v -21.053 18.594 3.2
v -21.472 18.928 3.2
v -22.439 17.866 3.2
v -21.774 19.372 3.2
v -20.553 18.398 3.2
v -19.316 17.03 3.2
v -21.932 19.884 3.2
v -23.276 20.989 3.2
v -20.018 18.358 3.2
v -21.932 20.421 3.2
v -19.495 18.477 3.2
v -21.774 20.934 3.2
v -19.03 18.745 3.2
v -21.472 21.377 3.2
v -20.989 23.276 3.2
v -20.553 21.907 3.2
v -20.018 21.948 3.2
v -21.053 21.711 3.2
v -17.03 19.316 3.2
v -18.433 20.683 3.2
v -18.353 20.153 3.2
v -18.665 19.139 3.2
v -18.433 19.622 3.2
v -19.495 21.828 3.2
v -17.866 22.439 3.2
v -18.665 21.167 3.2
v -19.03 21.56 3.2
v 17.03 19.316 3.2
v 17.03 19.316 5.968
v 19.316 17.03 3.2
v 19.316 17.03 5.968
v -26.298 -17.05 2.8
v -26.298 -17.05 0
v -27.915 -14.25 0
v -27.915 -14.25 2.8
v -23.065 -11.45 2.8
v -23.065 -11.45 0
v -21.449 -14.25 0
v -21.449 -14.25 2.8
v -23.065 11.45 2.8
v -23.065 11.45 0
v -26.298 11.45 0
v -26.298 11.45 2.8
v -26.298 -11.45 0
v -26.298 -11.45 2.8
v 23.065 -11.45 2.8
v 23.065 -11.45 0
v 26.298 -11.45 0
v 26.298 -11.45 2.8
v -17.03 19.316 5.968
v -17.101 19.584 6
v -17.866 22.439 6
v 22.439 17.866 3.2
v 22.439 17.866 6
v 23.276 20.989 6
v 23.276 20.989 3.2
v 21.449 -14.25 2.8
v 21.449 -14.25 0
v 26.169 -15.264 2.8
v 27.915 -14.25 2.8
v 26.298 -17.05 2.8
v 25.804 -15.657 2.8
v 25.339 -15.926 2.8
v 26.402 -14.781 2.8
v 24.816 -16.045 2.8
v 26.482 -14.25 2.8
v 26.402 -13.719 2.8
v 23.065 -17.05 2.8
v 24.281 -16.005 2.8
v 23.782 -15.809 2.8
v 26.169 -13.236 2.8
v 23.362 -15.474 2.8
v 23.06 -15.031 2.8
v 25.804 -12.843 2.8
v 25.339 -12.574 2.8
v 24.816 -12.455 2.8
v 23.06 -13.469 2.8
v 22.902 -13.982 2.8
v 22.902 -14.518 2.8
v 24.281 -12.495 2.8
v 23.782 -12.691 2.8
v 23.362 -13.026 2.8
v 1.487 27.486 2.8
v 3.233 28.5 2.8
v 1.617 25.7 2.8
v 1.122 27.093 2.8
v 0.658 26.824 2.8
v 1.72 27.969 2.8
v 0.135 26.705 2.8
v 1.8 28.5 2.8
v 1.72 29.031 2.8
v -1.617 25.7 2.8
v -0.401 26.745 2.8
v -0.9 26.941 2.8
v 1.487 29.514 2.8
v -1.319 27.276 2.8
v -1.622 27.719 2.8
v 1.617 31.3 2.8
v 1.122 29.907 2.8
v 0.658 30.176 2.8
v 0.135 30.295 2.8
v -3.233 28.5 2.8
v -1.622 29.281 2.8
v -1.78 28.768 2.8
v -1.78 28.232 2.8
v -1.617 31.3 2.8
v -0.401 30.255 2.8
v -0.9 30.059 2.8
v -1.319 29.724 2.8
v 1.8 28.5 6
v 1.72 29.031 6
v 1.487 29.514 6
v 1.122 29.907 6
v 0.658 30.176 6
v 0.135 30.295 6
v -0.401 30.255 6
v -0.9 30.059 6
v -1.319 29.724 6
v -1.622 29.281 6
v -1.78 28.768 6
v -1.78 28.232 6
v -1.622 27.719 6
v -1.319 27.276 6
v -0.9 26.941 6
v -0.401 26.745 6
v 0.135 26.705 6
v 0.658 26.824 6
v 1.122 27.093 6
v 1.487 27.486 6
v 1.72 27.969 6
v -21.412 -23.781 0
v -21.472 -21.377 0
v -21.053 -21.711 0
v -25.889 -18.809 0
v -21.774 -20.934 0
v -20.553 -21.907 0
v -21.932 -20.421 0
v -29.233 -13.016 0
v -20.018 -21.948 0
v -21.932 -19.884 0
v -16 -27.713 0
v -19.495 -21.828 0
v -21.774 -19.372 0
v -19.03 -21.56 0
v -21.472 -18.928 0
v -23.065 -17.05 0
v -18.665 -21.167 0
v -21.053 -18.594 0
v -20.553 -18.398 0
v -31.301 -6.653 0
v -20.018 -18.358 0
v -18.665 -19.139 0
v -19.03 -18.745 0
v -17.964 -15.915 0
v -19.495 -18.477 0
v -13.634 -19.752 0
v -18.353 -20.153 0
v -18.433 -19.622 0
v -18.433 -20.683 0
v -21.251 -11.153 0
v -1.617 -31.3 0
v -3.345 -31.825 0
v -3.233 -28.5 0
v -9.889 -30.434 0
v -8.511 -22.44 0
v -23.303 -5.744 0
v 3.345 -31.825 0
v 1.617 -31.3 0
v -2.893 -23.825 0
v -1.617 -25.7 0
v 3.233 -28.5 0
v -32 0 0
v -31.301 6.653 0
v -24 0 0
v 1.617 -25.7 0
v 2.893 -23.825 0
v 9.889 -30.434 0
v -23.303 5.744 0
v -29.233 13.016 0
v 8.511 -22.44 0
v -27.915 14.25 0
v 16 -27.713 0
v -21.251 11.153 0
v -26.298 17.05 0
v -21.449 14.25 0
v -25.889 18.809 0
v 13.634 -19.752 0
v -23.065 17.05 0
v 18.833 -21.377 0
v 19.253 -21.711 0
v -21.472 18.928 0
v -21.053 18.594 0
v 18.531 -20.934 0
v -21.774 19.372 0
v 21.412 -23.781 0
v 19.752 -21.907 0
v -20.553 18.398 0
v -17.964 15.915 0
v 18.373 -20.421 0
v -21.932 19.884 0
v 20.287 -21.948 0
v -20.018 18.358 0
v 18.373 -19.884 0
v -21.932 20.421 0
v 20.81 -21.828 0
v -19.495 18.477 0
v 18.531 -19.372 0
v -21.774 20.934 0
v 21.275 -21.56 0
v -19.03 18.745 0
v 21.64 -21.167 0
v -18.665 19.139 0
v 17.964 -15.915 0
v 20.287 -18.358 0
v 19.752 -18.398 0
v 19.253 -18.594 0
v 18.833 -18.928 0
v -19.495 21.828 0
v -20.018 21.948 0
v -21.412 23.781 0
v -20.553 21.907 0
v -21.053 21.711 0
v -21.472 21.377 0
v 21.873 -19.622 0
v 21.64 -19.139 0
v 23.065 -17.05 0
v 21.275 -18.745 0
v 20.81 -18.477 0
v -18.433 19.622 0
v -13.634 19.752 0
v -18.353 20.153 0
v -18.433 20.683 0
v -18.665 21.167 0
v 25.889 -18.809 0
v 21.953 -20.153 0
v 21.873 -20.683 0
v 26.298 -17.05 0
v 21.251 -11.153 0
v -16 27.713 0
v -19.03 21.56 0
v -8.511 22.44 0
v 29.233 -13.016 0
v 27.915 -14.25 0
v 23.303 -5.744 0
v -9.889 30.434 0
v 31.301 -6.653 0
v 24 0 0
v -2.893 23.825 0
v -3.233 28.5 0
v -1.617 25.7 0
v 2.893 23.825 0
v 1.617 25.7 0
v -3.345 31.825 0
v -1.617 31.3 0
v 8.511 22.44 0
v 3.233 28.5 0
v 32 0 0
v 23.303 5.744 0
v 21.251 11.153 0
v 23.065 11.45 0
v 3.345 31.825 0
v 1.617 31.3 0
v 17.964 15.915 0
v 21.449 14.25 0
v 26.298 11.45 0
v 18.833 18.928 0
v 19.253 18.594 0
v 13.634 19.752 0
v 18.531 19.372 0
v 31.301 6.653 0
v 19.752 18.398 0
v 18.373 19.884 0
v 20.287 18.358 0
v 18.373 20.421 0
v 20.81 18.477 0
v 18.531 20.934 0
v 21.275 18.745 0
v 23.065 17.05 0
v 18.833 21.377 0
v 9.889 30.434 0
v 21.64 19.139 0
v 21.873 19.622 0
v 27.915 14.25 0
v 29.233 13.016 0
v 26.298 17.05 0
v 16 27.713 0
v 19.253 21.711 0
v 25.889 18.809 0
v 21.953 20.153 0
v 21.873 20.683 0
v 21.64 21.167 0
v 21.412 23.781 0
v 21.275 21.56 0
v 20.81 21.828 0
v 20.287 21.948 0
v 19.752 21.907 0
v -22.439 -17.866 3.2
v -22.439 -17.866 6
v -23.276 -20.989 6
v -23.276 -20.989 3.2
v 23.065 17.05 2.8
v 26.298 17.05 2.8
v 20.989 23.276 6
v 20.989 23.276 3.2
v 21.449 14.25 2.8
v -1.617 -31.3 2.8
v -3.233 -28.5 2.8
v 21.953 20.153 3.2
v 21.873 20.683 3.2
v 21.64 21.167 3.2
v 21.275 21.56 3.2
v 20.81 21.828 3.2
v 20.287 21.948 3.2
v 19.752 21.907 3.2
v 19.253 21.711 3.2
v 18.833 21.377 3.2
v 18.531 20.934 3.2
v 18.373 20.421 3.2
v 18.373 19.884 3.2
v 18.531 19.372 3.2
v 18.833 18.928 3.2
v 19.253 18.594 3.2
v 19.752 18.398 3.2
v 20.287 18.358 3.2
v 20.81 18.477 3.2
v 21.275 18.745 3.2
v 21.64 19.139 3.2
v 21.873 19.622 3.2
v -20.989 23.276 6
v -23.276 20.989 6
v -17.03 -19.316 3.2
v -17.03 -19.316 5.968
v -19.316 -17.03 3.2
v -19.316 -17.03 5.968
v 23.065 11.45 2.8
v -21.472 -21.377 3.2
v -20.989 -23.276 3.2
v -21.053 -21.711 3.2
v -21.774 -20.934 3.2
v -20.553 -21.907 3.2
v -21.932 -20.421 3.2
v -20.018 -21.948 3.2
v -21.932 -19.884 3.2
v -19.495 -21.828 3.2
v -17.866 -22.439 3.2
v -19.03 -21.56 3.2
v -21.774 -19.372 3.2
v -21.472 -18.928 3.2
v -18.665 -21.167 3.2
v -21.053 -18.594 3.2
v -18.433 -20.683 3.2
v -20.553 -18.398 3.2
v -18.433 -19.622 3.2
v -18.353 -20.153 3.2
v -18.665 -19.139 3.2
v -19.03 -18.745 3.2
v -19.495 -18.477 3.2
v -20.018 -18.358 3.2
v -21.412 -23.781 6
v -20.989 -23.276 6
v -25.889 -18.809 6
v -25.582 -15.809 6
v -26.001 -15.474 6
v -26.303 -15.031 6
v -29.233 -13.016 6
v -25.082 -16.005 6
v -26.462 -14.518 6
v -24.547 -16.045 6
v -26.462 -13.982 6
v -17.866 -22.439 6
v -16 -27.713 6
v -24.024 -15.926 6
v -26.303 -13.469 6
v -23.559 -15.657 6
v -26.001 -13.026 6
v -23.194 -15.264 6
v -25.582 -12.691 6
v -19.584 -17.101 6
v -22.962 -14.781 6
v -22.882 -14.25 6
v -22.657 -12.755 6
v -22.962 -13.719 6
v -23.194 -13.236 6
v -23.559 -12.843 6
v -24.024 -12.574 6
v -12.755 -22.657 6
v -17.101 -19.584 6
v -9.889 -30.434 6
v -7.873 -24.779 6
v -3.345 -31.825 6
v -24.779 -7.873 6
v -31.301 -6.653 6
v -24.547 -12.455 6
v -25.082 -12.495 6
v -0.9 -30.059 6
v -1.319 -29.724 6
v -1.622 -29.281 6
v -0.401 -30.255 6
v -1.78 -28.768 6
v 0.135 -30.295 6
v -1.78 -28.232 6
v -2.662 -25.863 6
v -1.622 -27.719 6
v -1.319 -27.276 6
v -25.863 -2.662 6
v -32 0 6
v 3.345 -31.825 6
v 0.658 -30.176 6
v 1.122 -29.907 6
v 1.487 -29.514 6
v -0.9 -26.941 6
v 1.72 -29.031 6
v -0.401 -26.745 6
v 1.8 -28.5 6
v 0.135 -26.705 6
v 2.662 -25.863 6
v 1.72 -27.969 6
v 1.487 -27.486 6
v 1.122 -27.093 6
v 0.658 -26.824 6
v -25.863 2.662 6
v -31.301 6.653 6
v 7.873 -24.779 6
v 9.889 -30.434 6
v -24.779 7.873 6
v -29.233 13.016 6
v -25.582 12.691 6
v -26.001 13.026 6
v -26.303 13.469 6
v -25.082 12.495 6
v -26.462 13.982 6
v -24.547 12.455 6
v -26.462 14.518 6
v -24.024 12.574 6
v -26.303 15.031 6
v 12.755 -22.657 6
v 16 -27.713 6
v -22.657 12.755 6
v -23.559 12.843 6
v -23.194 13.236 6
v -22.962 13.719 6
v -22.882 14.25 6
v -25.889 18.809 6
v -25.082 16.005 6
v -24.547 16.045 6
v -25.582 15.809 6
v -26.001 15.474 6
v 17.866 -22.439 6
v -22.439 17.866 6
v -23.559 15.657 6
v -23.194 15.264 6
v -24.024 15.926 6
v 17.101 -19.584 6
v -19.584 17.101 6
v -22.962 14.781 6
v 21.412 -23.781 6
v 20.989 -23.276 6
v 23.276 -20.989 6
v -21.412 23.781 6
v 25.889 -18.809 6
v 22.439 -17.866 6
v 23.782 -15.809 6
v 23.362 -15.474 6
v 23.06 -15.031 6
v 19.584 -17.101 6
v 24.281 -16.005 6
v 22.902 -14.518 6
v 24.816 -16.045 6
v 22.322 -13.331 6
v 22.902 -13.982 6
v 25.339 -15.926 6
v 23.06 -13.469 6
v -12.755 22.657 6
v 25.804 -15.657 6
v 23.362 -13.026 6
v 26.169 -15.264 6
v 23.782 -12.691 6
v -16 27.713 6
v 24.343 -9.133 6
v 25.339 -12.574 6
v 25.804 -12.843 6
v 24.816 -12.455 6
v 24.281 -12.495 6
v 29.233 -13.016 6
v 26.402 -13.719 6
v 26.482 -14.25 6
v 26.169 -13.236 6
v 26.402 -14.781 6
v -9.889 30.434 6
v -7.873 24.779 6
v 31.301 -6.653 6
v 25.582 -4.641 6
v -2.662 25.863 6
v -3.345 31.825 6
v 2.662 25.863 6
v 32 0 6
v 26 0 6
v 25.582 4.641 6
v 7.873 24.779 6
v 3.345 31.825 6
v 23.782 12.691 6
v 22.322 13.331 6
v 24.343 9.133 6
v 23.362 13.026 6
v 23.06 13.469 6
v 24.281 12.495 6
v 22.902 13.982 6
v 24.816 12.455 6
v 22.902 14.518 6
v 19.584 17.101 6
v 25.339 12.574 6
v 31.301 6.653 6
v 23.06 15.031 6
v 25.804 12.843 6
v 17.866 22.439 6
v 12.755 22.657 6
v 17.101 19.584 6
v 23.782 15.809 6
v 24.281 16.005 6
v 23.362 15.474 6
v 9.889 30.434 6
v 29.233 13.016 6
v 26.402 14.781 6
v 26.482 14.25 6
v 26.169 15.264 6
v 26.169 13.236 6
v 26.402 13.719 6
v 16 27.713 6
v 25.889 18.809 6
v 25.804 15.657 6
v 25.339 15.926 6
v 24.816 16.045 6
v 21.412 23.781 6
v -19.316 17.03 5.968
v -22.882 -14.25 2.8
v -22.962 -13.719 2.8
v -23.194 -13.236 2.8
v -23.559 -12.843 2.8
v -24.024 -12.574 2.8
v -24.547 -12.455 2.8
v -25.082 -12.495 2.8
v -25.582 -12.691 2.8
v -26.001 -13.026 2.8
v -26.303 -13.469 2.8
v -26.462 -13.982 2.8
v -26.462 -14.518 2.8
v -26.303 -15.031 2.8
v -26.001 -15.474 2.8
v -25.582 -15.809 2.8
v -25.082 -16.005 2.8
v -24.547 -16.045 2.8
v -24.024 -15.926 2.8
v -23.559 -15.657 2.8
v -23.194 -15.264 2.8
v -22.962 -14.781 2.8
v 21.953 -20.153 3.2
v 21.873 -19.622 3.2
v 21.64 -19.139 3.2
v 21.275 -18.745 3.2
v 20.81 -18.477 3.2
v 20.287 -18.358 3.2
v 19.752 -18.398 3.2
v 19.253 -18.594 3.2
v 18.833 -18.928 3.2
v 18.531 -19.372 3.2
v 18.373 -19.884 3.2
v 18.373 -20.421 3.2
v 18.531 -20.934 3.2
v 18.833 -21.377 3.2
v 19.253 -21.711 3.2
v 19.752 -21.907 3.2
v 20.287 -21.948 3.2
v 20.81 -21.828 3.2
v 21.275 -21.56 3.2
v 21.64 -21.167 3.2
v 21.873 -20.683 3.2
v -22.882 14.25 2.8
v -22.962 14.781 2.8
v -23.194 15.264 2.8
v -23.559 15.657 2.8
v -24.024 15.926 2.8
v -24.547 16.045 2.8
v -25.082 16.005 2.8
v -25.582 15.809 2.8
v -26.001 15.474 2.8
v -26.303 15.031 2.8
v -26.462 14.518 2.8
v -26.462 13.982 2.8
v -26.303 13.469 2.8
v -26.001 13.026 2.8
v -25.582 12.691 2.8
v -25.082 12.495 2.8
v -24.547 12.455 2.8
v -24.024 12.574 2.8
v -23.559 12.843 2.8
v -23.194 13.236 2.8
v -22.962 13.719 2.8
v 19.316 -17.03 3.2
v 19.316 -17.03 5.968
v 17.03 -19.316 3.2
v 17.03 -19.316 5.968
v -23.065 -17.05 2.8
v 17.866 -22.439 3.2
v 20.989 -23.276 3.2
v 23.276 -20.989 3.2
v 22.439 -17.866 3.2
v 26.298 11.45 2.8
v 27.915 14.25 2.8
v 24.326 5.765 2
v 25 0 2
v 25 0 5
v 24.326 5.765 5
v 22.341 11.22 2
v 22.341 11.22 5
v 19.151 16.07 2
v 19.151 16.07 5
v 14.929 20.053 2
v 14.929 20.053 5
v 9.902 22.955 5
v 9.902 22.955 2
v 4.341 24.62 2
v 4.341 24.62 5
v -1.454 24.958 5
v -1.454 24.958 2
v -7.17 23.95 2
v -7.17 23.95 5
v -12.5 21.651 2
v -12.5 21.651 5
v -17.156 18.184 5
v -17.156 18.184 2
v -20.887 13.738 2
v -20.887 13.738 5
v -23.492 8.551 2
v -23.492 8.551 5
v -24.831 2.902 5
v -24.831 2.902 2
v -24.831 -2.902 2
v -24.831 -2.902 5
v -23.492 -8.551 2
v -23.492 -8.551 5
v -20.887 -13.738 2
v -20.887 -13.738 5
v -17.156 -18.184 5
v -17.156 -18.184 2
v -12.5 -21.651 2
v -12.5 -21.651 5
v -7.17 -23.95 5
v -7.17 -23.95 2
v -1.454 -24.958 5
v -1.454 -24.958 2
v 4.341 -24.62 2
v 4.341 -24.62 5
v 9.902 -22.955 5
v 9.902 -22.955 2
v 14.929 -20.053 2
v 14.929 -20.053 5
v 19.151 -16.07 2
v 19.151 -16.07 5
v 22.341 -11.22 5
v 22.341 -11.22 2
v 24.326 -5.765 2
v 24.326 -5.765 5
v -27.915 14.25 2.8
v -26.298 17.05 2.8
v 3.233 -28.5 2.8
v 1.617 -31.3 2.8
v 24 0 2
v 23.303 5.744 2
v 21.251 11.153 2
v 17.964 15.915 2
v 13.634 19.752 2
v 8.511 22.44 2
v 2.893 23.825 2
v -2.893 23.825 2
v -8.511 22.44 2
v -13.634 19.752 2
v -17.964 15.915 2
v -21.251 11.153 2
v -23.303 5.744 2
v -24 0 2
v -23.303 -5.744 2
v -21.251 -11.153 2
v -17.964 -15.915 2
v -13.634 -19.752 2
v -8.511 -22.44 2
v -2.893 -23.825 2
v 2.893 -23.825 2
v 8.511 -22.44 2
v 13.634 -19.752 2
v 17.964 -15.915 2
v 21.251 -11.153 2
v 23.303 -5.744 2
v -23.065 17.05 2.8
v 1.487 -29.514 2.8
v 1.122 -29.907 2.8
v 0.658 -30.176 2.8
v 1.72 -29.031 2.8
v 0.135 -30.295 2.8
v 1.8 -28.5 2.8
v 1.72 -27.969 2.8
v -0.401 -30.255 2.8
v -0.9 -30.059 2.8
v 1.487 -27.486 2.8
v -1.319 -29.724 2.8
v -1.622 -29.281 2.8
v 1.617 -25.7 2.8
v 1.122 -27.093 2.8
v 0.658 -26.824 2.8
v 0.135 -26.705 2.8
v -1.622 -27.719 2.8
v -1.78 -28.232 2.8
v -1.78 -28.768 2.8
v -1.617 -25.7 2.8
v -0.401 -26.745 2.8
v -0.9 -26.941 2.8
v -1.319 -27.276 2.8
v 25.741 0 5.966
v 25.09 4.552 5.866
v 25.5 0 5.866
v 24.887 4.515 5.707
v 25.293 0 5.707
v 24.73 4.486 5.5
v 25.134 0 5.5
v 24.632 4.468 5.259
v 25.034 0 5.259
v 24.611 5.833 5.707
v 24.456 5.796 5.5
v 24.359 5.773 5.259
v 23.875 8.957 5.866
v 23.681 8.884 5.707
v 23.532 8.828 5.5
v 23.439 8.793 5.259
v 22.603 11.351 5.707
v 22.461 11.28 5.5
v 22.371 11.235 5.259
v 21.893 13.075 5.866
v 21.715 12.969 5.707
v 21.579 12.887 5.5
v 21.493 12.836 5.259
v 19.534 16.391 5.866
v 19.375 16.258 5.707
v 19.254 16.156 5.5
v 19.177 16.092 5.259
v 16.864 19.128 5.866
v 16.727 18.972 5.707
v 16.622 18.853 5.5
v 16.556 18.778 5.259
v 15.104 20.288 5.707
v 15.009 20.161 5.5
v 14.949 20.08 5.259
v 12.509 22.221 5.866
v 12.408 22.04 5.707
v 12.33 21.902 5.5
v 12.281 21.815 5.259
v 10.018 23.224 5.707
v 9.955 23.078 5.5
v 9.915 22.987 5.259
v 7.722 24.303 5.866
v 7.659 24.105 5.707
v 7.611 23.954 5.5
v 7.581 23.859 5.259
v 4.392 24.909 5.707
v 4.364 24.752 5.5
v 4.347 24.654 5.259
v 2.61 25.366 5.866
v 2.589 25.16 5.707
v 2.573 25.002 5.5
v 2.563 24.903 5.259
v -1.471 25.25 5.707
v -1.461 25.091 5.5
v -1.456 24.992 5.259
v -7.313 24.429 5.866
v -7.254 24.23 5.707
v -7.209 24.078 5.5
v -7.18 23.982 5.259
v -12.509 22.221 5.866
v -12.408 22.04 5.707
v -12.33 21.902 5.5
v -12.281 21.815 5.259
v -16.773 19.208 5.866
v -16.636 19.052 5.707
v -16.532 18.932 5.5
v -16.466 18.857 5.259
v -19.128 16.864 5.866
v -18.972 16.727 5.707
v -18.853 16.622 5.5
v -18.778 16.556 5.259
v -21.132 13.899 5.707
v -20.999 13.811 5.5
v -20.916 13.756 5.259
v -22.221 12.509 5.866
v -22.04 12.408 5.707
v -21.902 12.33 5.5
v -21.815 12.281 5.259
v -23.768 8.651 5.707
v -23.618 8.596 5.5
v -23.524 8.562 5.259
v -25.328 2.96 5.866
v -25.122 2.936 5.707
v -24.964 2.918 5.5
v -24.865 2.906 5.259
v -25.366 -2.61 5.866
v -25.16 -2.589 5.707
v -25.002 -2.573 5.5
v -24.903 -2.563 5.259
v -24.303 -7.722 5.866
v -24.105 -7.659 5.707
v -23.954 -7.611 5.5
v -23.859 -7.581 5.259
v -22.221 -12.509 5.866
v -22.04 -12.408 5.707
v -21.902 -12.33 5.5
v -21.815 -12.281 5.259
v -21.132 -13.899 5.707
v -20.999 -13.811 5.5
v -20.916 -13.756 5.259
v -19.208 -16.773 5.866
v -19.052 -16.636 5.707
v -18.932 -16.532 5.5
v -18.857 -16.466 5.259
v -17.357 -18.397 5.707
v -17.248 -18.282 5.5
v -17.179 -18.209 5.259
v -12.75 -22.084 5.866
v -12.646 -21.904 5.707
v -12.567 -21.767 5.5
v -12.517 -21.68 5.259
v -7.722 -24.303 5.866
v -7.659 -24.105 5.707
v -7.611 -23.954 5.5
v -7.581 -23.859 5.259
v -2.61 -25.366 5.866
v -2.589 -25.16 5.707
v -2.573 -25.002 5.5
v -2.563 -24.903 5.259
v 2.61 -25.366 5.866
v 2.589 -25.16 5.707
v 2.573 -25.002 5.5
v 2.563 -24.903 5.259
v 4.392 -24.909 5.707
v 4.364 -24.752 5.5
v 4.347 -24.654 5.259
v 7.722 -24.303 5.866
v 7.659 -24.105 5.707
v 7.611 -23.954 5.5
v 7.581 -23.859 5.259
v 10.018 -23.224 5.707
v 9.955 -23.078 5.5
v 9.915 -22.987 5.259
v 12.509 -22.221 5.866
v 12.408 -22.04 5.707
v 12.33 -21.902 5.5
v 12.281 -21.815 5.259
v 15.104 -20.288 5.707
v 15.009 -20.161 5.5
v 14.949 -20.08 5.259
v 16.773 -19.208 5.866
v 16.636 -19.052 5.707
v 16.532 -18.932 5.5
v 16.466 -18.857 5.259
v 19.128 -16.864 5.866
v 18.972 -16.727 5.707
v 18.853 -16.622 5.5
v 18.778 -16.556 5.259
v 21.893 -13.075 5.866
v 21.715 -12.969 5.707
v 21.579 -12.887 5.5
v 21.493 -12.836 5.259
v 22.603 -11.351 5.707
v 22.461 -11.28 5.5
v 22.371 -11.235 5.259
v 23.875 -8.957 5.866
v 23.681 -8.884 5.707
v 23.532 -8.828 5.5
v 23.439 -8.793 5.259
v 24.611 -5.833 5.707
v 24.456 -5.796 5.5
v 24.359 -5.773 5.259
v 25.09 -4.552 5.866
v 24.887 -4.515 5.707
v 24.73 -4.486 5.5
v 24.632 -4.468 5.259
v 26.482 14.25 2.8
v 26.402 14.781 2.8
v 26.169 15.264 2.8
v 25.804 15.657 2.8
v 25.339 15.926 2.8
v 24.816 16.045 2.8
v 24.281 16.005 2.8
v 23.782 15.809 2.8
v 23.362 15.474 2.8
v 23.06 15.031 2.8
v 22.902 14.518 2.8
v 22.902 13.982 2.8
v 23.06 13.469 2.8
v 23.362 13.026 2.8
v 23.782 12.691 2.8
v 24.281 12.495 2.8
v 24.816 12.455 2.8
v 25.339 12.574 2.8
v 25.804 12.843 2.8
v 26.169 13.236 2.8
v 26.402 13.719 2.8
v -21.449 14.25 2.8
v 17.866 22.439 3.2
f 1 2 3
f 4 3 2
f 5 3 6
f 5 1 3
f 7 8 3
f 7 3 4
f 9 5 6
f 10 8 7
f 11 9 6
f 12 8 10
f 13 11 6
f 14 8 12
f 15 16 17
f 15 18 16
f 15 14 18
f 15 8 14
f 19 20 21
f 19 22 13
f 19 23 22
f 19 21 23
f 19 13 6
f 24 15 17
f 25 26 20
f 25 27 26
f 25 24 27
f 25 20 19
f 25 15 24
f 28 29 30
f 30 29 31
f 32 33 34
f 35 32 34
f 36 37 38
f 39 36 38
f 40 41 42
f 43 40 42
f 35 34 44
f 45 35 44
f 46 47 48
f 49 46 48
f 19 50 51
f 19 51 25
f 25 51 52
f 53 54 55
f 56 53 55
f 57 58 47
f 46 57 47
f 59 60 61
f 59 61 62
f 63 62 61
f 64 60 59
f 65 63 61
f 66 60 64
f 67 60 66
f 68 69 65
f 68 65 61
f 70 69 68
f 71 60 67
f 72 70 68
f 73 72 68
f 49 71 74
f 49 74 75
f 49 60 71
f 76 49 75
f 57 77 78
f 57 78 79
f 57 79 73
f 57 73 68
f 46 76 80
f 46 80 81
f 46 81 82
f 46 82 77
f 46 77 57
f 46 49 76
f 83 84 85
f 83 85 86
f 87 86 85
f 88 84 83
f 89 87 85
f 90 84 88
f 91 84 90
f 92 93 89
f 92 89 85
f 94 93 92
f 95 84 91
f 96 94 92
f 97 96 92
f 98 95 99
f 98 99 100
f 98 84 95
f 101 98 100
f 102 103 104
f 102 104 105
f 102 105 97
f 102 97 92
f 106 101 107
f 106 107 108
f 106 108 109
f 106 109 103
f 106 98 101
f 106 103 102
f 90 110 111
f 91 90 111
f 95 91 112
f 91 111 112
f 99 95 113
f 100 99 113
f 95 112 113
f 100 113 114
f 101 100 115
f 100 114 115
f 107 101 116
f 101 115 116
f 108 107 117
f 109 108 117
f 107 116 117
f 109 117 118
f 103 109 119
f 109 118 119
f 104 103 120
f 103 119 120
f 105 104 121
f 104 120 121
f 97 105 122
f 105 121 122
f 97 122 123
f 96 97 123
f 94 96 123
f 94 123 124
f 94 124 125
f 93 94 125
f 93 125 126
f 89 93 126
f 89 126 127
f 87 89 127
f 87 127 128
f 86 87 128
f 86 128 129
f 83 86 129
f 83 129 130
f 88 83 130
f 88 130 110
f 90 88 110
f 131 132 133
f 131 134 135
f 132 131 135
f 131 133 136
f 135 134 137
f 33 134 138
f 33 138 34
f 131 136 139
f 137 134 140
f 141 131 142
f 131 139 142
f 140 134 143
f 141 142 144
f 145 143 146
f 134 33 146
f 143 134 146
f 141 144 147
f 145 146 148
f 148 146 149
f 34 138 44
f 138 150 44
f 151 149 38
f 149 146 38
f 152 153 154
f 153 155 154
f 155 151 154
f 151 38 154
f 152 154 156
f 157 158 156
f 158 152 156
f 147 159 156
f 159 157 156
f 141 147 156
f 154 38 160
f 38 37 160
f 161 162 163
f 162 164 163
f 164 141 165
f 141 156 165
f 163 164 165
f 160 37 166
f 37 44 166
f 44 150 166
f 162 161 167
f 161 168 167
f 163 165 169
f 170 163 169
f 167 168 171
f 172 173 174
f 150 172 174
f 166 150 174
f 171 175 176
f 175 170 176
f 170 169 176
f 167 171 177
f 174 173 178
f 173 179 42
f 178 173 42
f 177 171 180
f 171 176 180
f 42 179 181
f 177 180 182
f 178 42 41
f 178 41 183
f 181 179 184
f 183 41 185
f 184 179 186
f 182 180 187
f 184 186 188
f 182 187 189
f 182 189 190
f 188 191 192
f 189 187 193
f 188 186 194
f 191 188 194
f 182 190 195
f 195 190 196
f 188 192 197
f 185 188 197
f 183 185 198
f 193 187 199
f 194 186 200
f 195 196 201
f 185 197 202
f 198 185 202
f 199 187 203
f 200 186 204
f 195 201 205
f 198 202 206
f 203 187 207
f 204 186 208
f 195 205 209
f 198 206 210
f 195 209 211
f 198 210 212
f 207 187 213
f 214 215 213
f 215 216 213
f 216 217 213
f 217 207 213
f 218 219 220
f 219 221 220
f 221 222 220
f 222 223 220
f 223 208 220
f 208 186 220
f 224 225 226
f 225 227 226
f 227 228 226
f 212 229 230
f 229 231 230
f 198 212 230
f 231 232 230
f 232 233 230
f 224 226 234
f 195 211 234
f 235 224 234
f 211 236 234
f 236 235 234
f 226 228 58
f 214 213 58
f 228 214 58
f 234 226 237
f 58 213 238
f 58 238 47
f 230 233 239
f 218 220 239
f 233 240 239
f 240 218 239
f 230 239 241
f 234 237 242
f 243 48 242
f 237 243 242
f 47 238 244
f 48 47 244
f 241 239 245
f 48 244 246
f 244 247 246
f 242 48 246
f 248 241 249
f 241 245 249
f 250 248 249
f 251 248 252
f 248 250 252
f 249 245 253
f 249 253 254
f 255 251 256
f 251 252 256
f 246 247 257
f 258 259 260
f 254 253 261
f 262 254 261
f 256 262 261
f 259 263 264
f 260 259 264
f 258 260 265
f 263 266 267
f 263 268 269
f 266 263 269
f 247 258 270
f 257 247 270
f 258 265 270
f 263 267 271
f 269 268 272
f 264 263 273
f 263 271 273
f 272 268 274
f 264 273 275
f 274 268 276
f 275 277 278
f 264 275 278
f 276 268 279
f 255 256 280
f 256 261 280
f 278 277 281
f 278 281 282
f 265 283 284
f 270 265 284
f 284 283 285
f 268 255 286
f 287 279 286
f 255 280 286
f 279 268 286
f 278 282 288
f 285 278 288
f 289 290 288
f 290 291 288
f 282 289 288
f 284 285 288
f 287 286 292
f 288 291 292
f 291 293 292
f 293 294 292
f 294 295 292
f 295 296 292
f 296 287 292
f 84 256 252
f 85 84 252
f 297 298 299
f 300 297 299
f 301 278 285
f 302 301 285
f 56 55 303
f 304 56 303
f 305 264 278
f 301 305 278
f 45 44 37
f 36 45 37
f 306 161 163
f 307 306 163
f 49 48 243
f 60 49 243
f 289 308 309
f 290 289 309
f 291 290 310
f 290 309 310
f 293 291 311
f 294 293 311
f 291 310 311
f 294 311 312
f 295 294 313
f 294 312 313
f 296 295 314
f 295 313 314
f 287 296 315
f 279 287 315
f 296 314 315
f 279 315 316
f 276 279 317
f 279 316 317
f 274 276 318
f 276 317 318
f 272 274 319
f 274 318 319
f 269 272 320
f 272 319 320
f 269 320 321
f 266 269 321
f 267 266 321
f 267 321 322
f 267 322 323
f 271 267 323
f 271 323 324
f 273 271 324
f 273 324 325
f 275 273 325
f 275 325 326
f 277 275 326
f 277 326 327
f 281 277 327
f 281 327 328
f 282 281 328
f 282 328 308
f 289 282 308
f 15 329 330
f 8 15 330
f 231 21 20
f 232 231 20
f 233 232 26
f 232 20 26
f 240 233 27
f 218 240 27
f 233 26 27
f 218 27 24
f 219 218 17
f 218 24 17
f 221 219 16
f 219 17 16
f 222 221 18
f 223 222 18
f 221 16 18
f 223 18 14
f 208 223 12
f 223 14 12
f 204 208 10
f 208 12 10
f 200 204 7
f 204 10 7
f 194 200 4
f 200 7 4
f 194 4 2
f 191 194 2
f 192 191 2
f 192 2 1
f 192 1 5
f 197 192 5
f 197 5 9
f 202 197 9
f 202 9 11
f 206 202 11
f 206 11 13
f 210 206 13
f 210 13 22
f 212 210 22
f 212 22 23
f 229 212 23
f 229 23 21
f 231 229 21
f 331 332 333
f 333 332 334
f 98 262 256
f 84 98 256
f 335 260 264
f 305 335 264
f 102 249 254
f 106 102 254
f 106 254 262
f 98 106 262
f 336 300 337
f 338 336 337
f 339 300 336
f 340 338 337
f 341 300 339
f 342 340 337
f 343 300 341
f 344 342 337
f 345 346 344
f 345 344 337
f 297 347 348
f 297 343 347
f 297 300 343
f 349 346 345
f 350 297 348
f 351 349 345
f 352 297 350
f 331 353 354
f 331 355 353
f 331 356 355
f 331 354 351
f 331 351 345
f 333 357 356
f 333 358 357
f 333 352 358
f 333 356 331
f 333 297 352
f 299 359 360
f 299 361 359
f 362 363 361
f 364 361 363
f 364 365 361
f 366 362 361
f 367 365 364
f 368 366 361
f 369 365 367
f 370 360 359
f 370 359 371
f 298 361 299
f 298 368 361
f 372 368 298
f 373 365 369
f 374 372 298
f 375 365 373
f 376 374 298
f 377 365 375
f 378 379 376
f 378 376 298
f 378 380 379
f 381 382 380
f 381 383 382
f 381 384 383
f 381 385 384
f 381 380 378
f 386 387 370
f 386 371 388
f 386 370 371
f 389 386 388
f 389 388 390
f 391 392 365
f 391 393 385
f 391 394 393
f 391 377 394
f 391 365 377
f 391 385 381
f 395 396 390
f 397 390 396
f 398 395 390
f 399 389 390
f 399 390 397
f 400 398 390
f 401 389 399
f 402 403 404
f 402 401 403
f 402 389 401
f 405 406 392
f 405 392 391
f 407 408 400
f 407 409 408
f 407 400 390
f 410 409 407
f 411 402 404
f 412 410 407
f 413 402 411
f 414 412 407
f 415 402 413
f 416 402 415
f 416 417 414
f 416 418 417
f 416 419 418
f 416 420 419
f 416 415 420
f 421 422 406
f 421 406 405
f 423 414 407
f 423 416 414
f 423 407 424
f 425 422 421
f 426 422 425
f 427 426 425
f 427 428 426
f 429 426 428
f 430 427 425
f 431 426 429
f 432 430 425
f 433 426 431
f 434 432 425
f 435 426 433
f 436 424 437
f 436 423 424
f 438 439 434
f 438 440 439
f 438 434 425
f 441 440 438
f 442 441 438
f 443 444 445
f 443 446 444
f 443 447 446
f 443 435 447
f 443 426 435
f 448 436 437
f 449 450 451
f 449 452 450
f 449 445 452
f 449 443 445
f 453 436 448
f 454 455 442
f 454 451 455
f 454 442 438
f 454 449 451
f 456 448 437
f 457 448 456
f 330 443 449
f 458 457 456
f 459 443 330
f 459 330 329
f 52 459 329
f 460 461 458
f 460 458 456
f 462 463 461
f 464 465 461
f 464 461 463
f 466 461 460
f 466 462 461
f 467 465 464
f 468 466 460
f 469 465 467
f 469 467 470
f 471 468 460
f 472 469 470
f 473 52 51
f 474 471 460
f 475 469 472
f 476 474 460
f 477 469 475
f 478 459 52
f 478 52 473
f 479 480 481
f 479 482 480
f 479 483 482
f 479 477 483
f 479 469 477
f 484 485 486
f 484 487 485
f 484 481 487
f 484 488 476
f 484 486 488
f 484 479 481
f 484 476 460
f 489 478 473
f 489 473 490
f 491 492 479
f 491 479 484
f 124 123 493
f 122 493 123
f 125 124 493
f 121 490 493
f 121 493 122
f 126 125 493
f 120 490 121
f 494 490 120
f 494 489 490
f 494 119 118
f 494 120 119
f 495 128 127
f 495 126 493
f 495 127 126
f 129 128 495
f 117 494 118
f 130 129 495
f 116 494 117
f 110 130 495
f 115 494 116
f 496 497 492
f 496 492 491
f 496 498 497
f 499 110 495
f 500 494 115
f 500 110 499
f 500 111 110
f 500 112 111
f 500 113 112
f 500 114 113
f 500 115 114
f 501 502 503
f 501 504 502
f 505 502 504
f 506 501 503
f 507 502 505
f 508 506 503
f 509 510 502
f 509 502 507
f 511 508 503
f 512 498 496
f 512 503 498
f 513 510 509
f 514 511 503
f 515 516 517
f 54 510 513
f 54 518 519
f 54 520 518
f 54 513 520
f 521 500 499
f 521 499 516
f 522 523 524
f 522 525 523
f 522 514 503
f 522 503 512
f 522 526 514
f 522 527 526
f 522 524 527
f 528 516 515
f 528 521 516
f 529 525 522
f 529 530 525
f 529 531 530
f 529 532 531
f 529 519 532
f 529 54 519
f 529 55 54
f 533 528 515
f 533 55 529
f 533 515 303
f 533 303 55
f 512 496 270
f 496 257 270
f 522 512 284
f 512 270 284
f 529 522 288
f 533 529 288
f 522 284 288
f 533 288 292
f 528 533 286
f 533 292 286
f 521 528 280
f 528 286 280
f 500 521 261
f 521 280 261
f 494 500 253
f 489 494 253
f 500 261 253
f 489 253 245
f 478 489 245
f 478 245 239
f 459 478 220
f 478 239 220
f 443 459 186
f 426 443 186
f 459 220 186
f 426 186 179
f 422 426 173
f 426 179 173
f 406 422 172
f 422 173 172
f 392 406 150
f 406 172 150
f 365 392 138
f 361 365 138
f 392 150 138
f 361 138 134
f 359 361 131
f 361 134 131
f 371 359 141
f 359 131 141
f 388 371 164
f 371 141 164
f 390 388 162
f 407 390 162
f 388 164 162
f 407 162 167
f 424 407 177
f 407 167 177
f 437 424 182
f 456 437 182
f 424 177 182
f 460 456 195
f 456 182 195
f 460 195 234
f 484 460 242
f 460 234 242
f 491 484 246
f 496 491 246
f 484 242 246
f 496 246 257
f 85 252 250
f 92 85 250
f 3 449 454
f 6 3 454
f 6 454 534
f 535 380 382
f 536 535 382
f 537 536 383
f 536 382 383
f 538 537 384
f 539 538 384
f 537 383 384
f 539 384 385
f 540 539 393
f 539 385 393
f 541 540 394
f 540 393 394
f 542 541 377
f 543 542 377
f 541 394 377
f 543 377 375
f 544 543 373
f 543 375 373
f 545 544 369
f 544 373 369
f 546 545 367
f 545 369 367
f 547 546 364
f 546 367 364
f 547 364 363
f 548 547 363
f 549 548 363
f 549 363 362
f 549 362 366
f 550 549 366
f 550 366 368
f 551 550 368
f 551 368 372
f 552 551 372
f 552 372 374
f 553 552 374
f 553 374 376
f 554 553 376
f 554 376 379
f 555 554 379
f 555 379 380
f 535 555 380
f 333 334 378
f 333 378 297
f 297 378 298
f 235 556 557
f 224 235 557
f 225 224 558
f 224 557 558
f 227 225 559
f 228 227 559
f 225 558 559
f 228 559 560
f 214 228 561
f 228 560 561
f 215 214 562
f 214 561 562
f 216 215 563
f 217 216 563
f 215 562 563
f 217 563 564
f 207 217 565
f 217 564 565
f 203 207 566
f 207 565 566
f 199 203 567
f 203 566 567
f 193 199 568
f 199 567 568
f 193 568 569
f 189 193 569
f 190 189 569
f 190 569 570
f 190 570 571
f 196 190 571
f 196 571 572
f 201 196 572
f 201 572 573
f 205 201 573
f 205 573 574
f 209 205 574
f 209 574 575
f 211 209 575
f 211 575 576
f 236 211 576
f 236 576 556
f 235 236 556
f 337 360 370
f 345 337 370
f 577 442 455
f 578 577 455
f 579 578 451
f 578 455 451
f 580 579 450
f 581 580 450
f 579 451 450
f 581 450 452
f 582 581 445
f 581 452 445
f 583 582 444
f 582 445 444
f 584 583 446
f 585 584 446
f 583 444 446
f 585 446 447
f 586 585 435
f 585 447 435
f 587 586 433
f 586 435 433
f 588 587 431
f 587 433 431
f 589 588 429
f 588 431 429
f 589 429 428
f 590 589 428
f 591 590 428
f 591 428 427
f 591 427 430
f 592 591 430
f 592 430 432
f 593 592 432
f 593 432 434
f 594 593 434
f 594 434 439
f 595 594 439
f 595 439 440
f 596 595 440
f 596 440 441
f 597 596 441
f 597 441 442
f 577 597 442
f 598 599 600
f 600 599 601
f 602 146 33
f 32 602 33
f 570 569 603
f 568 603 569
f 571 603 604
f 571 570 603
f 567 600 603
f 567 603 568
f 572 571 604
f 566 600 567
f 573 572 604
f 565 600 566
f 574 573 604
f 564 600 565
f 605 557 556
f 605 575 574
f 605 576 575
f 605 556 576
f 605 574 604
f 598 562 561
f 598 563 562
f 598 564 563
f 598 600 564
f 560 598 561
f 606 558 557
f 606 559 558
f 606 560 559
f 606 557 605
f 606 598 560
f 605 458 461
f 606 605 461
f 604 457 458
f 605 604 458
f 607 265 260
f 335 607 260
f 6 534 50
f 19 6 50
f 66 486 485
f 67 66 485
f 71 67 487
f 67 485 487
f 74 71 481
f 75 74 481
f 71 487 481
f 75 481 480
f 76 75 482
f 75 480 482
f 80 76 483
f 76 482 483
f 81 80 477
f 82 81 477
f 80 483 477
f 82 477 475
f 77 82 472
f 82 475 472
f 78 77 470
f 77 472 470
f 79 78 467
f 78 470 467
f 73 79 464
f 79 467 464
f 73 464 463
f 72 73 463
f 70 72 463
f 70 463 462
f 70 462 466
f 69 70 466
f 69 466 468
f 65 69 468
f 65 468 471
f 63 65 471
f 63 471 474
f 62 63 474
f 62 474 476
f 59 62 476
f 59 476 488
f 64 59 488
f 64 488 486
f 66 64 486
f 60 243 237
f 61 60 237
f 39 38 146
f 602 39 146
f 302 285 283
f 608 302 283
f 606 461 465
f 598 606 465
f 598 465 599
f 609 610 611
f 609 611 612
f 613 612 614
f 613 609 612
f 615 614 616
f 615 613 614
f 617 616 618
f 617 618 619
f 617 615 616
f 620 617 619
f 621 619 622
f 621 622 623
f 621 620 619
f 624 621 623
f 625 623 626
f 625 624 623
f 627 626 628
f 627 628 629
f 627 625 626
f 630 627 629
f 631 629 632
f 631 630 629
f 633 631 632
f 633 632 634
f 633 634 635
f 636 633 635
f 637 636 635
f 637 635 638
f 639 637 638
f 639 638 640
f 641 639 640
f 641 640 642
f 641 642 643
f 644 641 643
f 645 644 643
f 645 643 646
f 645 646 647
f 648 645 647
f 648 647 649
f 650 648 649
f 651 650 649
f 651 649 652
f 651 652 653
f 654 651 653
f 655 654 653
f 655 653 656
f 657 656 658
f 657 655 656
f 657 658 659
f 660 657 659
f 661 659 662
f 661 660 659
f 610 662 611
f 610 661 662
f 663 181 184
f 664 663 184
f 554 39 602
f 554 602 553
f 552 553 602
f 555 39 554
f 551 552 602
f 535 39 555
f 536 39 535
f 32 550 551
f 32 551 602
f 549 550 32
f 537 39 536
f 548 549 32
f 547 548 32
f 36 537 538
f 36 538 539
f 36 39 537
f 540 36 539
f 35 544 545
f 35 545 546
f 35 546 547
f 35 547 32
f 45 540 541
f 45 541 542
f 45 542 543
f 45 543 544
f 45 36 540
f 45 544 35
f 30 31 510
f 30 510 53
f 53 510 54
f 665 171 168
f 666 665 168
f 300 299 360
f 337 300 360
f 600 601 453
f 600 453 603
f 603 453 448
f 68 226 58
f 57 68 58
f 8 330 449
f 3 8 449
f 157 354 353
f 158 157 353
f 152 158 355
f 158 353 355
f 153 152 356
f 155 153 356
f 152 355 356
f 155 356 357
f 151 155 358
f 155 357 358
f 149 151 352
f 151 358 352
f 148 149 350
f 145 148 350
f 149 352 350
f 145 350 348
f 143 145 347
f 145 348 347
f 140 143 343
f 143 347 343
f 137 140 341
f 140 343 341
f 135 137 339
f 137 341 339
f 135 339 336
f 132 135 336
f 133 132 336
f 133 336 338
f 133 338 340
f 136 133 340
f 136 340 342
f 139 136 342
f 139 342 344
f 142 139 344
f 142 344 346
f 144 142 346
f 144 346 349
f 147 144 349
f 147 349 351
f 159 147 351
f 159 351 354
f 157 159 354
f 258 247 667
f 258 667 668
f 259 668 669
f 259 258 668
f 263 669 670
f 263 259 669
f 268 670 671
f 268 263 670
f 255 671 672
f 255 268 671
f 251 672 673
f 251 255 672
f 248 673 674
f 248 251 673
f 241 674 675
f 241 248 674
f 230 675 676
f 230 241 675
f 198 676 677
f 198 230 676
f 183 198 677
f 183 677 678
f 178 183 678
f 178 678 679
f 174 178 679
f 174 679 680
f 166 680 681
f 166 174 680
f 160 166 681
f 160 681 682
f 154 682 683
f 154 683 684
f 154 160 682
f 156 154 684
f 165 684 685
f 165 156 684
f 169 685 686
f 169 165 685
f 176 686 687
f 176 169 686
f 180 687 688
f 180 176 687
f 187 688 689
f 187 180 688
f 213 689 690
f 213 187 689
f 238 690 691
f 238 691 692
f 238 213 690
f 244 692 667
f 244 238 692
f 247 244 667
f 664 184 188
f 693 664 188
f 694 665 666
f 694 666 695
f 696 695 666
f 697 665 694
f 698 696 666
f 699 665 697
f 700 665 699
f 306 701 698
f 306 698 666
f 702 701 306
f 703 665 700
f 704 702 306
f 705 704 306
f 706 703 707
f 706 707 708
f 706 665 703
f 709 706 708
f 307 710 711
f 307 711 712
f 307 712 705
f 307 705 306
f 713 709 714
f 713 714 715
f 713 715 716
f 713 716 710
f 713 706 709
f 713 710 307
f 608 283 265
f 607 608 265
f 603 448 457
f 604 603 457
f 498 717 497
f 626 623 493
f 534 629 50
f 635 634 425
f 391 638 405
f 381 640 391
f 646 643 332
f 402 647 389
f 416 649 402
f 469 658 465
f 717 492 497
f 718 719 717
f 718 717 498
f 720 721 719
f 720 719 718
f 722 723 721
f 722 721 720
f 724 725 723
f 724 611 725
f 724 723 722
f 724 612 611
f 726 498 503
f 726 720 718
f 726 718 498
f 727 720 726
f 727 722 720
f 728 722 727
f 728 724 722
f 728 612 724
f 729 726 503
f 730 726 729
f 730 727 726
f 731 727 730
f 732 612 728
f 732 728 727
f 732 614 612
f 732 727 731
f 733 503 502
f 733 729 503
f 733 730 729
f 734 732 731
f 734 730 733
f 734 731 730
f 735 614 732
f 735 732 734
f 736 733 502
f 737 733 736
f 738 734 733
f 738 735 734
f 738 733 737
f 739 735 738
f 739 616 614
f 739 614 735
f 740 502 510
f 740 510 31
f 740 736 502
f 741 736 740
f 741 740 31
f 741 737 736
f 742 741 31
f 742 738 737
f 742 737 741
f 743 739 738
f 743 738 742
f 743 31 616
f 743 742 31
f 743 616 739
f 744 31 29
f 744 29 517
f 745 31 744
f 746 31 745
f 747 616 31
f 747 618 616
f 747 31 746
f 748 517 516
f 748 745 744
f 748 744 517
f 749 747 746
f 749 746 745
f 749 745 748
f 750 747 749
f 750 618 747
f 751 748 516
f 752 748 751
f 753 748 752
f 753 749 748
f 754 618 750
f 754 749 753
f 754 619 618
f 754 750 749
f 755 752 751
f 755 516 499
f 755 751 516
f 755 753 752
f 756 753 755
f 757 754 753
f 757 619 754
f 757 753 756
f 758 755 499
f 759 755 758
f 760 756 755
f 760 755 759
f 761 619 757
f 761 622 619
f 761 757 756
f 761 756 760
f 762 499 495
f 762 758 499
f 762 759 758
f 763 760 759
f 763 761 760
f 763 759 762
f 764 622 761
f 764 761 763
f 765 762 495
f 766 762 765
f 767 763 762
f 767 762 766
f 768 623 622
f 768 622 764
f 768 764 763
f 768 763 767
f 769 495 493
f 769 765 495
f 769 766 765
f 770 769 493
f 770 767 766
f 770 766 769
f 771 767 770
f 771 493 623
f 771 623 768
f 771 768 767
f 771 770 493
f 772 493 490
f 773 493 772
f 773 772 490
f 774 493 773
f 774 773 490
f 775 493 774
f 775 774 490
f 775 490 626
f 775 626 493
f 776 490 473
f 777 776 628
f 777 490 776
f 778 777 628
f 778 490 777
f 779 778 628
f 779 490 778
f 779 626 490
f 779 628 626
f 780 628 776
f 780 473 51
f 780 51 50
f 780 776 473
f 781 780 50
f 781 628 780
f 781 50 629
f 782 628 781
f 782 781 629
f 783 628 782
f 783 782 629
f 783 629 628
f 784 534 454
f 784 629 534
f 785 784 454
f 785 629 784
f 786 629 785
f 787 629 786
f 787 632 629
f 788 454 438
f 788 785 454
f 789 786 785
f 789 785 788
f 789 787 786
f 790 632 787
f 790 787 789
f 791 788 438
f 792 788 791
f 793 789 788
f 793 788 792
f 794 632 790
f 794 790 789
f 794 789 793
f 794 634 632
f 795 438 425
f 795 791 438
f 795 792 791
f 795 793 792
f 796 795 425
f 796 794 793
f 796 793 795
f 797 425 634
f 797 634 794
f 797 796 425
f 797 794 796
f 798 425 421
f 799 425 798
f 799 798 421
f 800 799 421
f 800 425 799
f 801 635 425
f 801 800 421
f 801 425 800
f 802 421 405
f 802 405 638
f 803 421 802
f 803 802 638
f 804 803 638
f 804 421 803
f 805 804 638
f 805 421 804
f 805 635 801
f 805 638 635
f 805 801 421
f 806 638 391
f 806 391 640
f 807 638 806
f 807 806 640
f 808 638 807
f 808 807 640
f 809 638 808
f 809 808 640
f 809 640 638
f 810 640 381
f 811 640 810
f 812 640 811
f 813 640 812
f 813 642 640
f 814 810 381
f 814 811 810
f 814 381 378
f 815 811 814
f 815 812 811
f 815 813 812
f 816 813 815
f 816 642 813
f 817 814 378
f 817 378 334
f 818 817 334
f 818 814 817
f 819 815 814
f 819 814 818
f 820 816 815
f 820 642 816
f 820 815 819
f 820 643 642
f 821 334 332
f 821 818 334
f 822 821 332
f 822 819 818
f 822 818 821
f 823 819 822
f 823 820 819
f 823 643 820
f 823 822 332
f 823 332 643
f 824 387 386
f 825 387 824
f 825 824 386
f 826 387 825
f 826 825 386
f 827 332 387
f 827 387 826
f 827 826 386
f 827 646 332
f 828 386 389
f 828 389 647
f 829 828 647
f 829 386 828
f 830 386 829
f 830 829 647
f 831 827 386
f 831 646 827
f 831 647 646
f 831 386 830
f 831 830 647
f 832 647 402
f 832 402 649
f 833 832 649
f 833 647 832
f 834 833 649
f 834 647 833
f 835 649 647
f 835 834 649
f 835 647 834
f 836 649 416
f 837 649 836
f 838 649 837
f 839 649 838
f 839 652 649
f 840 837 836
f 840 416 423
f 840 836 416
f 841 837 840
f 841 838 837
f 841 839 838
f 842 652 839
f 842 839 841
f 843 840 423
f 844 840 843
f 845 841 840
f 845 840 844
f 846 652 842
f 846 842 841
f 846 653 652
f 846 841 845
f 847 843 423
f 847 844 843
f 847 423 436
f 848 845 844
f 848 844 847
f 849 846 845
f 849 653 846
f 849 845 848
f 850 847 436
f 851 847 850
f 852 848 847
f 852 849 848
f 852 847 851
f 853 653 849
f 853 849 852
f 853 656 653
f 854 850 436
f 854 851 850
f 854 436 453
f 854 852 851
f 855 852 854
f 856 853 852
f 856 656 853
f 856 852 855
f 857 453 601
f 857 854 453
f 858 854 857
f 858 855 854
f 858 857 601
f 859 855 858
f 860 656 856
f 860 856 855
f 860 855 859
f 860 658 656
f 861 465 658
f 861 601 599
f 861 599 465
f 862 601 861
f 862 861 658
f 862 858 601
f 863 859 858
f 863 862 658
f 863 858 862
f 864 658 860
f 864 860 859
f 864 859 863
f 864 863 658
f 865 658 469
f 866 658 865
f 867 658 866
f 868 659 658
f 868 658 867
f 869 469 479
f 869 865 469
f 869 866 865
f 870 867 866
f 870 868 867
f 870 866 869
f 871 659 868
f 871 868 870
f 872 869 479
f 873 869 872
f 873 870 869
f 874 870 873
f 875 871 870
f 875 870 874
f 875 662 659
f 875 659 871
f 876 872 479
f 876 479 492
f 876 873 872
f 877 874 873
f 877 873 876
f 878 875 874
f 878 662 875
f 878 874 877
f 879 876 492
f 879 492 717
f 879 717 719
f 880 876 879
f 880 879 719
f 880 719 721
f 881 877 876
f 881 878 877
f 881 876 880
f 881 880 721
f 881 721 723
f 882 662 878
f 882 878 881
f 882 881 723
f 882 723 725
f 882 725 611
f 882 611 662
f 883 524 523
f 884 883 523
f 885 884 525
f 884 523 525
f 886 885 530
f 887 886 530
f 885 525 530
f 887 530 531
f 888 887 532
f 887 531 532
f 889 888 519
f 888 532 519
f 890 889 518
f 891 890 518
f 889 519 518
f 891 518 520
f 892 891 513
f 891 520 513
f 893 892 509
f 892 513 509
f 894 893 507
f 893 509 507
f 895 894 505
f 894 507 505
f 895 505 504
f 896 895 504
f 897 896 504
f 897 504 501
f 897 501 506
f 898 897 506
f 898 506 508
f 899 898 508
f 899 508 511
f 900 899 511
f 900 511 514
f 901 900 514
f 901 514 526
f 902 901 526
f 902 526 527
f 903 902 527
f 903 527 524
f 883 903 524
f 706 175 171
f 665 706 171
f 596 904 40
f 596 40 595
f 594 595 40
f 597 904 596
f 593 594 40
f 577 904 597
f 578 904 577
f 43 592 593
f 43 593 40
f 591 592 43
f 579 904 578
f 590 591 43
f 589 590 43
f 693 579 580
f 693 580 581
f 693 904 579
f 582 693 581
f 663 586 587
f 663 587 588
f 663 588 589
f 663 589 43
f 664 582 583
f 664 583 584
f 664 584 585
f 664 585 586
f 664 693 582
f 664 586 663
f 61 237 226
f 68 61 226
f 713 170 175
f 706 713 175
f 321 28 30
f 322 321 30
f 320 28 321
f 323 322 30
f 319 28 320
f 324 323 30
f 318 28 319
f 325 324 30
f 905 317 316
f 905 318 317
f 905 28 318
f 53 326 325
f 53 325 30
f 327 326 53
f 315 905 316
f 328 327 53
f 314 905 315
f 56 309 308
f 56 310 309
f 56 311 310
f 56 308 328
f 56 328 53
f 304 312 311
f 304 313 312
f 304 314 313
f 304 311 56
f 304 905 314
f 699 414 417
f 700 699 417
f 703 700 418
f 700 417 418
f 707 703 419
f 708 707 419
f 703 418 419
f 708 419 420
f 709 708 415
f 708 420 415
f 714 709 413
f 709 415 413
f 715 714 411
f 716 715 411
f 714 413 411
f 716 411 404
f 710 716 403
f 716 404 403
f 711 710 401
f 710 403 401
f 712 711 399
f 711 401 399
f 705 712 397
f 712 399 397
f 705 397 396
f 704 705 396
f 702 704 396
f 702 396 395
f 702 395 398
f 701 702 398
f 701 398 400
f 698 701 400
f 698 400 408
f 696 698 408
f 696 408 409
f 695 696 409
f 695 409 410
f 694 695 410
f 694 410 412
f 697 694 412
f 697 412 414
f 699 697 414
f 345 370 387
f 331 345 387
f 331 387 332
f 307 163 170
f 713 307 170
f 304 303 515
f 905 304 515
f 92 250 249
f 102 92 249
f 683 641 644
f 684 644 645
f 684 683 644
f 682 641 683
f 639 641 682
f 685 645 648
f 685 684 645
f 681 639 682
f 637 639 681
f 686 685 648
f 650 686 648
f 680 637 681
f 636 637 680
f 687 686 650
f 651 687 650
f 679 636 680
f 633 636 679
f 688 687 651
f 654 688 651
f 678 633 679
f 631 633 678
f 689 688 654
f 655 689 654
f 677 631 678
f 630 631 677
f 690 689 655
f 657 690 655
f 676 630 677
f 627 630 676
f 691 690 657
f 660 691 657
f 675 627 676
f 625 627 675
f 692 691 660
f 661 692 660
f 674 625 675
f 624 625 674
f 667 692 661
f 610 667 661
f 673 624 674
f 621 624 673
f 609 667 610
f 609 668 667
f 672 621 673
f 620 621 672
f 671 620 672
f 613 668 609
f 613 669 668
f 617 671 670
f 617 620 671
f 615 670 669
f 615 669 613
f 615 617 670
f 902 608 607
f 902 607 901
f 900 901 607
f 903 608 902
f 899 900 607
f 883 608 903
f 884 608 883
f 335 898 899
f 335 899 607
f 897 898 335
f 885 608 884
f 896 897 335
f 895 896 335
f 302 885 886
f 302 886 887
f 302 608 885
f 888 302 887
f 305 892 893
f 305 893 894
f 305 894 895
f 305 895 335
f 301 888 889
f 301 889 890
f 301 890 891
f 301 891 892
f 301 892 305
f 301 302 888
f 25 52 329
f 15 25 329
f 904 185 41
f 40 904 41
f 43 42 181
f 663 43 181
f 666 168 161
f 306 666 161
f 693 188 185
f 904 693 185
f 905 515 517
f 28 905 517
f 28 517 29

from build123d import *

# Parameters (mm, degrees)
SKETCH_1_R          = 32
SKETCH_1_R_2        = 24
EXTRUDE_1_DEPTH     = 2
SKETCH_2_R          = 32
SKETCH_2_R_2        = 25
EXTRUDE_2_DEPTH     = 4
SKETCH_3_R          = 1.8
CUT_EXTRUDE_1_DEPTH = 46.650848842
CUT_EXTRUDE_2_DEPTH = 2.8
SKETCH_6_R          = 1.8
CUT_EXTRUDE_3_DEPTH = 46.367830012
CUT_EXTRUDE_4_DEPTH = 2.8
FILLET_1_R          = 1


with BuildPart() as part:
    # 草图1 → 凸台-拉伸1 (new body)
    with BuildSketch(Plane.XY):
        Circle(SKETCH_1_R)
        Circle(SKETCH_1_R_2, mode=Mode.SUBTRACT)
    extrude(amount=EXTRUDE_1_DEPTH)

    # 草图2 → 凸台-拉伸2 (add)
    with BuildSketch(Plane.XY.offset(2)):
        Circle(SKETCH_2_R)
        Circle(SKETCH_2_R_2, mode=Mode.SUBTRACT)
    extrude(amount=EXTRUDE_2_DEPTH)

    # 草图3 → 切除-拉伸1 (cut, through all)
    with BuildSketch(Plane.XY.offset(6)):
        with Locations((0, 28.5)):
            Circle(SKETCH_3_R)
        with Locations((24.681724008, 14.25)):
            Circle(SKETCH_3_R)
        with Locations((24.681724008, -14.25)):
            Circle(SKETCH_3_R)
        with Locations((0, -28.5)):
            Circle(SKETCH_3_R)
        with Locations((-24.681724008, -14.25)):
            Circle(SKETCH_3_R)
        with Locations((-24.681724008, 14.25)):
            Circle(SKETCH_3_R)
    extrude(amount=-CUT_EXTRUDE_1_DEPTH, mode=Mode.SUBTRACT)

    # 草图5 → 切除-拉伸2 (cut)
    with BuildSketch(Plane.XY.offset(6)):
        Polygon((-17.866352837, 22.43873369), (-20.989347038, 23.275537464), (-23.275537464, 20.989347038), (-22.43873369, 17.866352837), (-19.31573949, 17.029549063), (-17.029549063, 19.31573949), align=None)
        Polygon((22.43873369, 17.866352837), (23.275537464, 20.989347038), (20.989347038, 23.275537464), (17.866352837, 22.43873369), (17.029549063, 19.31573949), (19.31573949, 17.029549063), align=None)
        Polygon((17.866352837, -22.43873369), (20.989347038, -23.275537464), (23.275537464, -20.989347038), (22.43873369, -17.866352837), (19.31573949, -17.029549063), (17.029549063, -19.31573949), align=None)
        Polygon((-22.43873369, -17.866352837), (-23.275537464, -20.989347038), (-20.989347038, -23.275537464), (-17.866352837, -22.43873369), (-17.029549063, -19.31573949), (-19.31573949, -17.029549063), align=None)
    extrude(amount=-CUT_EXTRUDE_2_DEPTH, mode=Mode.SUBTRACT)

    # 草图6 → 切除-拉伸3 (cut, through all)
    with BuildSketch(Plane.XY.offset(3.2)):
        with Locations((-20.152543264, 20.152543264)):
            Circle(SKETCH_6_R)
        with Locations((20.152543264, 20.152543264)):
            Circle(SKETCH_6_R)
        with Locations((20.152543264, -20.152543264)):
            Circle(SKETCH_6_R)
        with Locations((-20.152543264, -20.152543264)):
            Circle(SKETCH_6_R)
    extrude(amount=-CUT_EXTRUDE_3_DEPTH, mode=Mode.SUBTRACT)

    # 草图7 → 切除-拉伸4 (cut)
    with BuildSketch(Plane(origin=(0, 0, 0), x_dir=(-1, 0, 0), z_dir=(0, 0, -1))):
        Polygon((3.233161507, 28.5), (1.616580754, 31.3), (-1.616580754, 31.3), (-3.233161507, 28.5), (-1.616580754, 25.7), (1.616580754, 25.7), align=None)
        Polygon((26.298304762, 11.45), (27.914885515, 14.25), (26.298304762, 17.05), (23.065143254, 17.05), (21.4485625, 14.25), (23.065143254, 11.45), align=None)
        Polygon((23.065143254, -17.05), (26.298304762, -17.05), (27.914885515, -14.25), (26.298304762, -11.45), (23.065143254, -11.45), (21.4485625, -14.25), align=None)
        Polygon((-3.233161507, -28.5), (-1.616580754, -31.3), (1.616580754, -31.3), (3.233161507, -28.5), (1.616580754, -25.7), (-1.616580754, -25.7), align=None)
        Polygon((-26.298304762, -11.45), (-27.914885515, -14.25), (-26.298304762, -17.05), (-23.065143254, -17.05), (-21.4485625, -14.25), (-23.065143254, -11.45), align=None)
        Polygon((-23.065143254, 17.05), (-26.298304762, 17.05), (-27.914885515, 14.25), (-26.298304762, 11.45), (-23.065143254, 11.45), (-21.4485625, 14.25), align=None)
    extrude(amount=-CUT_EXTRUDE_4_DEPTH, mode=Mode.SUBTRACT)

    # 圆角1
    # the kernel refuses this fillet: 1 mm, written as the material it takes off along each edge
    with BuildSketch(Plane(origin=(0, 0, 6), x_dir=(1, 0, 0), z_dir=(0, -1, 0))) as fillet_1_piece_1:
        with BuildLine():
            CenterArc((25 + FILLET_1_R, -FILLET_1_R), FILLET_1_R, 90, 90)
            Line((25, -FILLET_1_R), (25, 0))
            Line((25, 0), (25 + FILLET_1_R, 0))
        make_face()
    revolve(axis=Axis((0, 0, 6), (0, 0, 1)), mode=Mode.SUBTRACT)


solid = part.part
